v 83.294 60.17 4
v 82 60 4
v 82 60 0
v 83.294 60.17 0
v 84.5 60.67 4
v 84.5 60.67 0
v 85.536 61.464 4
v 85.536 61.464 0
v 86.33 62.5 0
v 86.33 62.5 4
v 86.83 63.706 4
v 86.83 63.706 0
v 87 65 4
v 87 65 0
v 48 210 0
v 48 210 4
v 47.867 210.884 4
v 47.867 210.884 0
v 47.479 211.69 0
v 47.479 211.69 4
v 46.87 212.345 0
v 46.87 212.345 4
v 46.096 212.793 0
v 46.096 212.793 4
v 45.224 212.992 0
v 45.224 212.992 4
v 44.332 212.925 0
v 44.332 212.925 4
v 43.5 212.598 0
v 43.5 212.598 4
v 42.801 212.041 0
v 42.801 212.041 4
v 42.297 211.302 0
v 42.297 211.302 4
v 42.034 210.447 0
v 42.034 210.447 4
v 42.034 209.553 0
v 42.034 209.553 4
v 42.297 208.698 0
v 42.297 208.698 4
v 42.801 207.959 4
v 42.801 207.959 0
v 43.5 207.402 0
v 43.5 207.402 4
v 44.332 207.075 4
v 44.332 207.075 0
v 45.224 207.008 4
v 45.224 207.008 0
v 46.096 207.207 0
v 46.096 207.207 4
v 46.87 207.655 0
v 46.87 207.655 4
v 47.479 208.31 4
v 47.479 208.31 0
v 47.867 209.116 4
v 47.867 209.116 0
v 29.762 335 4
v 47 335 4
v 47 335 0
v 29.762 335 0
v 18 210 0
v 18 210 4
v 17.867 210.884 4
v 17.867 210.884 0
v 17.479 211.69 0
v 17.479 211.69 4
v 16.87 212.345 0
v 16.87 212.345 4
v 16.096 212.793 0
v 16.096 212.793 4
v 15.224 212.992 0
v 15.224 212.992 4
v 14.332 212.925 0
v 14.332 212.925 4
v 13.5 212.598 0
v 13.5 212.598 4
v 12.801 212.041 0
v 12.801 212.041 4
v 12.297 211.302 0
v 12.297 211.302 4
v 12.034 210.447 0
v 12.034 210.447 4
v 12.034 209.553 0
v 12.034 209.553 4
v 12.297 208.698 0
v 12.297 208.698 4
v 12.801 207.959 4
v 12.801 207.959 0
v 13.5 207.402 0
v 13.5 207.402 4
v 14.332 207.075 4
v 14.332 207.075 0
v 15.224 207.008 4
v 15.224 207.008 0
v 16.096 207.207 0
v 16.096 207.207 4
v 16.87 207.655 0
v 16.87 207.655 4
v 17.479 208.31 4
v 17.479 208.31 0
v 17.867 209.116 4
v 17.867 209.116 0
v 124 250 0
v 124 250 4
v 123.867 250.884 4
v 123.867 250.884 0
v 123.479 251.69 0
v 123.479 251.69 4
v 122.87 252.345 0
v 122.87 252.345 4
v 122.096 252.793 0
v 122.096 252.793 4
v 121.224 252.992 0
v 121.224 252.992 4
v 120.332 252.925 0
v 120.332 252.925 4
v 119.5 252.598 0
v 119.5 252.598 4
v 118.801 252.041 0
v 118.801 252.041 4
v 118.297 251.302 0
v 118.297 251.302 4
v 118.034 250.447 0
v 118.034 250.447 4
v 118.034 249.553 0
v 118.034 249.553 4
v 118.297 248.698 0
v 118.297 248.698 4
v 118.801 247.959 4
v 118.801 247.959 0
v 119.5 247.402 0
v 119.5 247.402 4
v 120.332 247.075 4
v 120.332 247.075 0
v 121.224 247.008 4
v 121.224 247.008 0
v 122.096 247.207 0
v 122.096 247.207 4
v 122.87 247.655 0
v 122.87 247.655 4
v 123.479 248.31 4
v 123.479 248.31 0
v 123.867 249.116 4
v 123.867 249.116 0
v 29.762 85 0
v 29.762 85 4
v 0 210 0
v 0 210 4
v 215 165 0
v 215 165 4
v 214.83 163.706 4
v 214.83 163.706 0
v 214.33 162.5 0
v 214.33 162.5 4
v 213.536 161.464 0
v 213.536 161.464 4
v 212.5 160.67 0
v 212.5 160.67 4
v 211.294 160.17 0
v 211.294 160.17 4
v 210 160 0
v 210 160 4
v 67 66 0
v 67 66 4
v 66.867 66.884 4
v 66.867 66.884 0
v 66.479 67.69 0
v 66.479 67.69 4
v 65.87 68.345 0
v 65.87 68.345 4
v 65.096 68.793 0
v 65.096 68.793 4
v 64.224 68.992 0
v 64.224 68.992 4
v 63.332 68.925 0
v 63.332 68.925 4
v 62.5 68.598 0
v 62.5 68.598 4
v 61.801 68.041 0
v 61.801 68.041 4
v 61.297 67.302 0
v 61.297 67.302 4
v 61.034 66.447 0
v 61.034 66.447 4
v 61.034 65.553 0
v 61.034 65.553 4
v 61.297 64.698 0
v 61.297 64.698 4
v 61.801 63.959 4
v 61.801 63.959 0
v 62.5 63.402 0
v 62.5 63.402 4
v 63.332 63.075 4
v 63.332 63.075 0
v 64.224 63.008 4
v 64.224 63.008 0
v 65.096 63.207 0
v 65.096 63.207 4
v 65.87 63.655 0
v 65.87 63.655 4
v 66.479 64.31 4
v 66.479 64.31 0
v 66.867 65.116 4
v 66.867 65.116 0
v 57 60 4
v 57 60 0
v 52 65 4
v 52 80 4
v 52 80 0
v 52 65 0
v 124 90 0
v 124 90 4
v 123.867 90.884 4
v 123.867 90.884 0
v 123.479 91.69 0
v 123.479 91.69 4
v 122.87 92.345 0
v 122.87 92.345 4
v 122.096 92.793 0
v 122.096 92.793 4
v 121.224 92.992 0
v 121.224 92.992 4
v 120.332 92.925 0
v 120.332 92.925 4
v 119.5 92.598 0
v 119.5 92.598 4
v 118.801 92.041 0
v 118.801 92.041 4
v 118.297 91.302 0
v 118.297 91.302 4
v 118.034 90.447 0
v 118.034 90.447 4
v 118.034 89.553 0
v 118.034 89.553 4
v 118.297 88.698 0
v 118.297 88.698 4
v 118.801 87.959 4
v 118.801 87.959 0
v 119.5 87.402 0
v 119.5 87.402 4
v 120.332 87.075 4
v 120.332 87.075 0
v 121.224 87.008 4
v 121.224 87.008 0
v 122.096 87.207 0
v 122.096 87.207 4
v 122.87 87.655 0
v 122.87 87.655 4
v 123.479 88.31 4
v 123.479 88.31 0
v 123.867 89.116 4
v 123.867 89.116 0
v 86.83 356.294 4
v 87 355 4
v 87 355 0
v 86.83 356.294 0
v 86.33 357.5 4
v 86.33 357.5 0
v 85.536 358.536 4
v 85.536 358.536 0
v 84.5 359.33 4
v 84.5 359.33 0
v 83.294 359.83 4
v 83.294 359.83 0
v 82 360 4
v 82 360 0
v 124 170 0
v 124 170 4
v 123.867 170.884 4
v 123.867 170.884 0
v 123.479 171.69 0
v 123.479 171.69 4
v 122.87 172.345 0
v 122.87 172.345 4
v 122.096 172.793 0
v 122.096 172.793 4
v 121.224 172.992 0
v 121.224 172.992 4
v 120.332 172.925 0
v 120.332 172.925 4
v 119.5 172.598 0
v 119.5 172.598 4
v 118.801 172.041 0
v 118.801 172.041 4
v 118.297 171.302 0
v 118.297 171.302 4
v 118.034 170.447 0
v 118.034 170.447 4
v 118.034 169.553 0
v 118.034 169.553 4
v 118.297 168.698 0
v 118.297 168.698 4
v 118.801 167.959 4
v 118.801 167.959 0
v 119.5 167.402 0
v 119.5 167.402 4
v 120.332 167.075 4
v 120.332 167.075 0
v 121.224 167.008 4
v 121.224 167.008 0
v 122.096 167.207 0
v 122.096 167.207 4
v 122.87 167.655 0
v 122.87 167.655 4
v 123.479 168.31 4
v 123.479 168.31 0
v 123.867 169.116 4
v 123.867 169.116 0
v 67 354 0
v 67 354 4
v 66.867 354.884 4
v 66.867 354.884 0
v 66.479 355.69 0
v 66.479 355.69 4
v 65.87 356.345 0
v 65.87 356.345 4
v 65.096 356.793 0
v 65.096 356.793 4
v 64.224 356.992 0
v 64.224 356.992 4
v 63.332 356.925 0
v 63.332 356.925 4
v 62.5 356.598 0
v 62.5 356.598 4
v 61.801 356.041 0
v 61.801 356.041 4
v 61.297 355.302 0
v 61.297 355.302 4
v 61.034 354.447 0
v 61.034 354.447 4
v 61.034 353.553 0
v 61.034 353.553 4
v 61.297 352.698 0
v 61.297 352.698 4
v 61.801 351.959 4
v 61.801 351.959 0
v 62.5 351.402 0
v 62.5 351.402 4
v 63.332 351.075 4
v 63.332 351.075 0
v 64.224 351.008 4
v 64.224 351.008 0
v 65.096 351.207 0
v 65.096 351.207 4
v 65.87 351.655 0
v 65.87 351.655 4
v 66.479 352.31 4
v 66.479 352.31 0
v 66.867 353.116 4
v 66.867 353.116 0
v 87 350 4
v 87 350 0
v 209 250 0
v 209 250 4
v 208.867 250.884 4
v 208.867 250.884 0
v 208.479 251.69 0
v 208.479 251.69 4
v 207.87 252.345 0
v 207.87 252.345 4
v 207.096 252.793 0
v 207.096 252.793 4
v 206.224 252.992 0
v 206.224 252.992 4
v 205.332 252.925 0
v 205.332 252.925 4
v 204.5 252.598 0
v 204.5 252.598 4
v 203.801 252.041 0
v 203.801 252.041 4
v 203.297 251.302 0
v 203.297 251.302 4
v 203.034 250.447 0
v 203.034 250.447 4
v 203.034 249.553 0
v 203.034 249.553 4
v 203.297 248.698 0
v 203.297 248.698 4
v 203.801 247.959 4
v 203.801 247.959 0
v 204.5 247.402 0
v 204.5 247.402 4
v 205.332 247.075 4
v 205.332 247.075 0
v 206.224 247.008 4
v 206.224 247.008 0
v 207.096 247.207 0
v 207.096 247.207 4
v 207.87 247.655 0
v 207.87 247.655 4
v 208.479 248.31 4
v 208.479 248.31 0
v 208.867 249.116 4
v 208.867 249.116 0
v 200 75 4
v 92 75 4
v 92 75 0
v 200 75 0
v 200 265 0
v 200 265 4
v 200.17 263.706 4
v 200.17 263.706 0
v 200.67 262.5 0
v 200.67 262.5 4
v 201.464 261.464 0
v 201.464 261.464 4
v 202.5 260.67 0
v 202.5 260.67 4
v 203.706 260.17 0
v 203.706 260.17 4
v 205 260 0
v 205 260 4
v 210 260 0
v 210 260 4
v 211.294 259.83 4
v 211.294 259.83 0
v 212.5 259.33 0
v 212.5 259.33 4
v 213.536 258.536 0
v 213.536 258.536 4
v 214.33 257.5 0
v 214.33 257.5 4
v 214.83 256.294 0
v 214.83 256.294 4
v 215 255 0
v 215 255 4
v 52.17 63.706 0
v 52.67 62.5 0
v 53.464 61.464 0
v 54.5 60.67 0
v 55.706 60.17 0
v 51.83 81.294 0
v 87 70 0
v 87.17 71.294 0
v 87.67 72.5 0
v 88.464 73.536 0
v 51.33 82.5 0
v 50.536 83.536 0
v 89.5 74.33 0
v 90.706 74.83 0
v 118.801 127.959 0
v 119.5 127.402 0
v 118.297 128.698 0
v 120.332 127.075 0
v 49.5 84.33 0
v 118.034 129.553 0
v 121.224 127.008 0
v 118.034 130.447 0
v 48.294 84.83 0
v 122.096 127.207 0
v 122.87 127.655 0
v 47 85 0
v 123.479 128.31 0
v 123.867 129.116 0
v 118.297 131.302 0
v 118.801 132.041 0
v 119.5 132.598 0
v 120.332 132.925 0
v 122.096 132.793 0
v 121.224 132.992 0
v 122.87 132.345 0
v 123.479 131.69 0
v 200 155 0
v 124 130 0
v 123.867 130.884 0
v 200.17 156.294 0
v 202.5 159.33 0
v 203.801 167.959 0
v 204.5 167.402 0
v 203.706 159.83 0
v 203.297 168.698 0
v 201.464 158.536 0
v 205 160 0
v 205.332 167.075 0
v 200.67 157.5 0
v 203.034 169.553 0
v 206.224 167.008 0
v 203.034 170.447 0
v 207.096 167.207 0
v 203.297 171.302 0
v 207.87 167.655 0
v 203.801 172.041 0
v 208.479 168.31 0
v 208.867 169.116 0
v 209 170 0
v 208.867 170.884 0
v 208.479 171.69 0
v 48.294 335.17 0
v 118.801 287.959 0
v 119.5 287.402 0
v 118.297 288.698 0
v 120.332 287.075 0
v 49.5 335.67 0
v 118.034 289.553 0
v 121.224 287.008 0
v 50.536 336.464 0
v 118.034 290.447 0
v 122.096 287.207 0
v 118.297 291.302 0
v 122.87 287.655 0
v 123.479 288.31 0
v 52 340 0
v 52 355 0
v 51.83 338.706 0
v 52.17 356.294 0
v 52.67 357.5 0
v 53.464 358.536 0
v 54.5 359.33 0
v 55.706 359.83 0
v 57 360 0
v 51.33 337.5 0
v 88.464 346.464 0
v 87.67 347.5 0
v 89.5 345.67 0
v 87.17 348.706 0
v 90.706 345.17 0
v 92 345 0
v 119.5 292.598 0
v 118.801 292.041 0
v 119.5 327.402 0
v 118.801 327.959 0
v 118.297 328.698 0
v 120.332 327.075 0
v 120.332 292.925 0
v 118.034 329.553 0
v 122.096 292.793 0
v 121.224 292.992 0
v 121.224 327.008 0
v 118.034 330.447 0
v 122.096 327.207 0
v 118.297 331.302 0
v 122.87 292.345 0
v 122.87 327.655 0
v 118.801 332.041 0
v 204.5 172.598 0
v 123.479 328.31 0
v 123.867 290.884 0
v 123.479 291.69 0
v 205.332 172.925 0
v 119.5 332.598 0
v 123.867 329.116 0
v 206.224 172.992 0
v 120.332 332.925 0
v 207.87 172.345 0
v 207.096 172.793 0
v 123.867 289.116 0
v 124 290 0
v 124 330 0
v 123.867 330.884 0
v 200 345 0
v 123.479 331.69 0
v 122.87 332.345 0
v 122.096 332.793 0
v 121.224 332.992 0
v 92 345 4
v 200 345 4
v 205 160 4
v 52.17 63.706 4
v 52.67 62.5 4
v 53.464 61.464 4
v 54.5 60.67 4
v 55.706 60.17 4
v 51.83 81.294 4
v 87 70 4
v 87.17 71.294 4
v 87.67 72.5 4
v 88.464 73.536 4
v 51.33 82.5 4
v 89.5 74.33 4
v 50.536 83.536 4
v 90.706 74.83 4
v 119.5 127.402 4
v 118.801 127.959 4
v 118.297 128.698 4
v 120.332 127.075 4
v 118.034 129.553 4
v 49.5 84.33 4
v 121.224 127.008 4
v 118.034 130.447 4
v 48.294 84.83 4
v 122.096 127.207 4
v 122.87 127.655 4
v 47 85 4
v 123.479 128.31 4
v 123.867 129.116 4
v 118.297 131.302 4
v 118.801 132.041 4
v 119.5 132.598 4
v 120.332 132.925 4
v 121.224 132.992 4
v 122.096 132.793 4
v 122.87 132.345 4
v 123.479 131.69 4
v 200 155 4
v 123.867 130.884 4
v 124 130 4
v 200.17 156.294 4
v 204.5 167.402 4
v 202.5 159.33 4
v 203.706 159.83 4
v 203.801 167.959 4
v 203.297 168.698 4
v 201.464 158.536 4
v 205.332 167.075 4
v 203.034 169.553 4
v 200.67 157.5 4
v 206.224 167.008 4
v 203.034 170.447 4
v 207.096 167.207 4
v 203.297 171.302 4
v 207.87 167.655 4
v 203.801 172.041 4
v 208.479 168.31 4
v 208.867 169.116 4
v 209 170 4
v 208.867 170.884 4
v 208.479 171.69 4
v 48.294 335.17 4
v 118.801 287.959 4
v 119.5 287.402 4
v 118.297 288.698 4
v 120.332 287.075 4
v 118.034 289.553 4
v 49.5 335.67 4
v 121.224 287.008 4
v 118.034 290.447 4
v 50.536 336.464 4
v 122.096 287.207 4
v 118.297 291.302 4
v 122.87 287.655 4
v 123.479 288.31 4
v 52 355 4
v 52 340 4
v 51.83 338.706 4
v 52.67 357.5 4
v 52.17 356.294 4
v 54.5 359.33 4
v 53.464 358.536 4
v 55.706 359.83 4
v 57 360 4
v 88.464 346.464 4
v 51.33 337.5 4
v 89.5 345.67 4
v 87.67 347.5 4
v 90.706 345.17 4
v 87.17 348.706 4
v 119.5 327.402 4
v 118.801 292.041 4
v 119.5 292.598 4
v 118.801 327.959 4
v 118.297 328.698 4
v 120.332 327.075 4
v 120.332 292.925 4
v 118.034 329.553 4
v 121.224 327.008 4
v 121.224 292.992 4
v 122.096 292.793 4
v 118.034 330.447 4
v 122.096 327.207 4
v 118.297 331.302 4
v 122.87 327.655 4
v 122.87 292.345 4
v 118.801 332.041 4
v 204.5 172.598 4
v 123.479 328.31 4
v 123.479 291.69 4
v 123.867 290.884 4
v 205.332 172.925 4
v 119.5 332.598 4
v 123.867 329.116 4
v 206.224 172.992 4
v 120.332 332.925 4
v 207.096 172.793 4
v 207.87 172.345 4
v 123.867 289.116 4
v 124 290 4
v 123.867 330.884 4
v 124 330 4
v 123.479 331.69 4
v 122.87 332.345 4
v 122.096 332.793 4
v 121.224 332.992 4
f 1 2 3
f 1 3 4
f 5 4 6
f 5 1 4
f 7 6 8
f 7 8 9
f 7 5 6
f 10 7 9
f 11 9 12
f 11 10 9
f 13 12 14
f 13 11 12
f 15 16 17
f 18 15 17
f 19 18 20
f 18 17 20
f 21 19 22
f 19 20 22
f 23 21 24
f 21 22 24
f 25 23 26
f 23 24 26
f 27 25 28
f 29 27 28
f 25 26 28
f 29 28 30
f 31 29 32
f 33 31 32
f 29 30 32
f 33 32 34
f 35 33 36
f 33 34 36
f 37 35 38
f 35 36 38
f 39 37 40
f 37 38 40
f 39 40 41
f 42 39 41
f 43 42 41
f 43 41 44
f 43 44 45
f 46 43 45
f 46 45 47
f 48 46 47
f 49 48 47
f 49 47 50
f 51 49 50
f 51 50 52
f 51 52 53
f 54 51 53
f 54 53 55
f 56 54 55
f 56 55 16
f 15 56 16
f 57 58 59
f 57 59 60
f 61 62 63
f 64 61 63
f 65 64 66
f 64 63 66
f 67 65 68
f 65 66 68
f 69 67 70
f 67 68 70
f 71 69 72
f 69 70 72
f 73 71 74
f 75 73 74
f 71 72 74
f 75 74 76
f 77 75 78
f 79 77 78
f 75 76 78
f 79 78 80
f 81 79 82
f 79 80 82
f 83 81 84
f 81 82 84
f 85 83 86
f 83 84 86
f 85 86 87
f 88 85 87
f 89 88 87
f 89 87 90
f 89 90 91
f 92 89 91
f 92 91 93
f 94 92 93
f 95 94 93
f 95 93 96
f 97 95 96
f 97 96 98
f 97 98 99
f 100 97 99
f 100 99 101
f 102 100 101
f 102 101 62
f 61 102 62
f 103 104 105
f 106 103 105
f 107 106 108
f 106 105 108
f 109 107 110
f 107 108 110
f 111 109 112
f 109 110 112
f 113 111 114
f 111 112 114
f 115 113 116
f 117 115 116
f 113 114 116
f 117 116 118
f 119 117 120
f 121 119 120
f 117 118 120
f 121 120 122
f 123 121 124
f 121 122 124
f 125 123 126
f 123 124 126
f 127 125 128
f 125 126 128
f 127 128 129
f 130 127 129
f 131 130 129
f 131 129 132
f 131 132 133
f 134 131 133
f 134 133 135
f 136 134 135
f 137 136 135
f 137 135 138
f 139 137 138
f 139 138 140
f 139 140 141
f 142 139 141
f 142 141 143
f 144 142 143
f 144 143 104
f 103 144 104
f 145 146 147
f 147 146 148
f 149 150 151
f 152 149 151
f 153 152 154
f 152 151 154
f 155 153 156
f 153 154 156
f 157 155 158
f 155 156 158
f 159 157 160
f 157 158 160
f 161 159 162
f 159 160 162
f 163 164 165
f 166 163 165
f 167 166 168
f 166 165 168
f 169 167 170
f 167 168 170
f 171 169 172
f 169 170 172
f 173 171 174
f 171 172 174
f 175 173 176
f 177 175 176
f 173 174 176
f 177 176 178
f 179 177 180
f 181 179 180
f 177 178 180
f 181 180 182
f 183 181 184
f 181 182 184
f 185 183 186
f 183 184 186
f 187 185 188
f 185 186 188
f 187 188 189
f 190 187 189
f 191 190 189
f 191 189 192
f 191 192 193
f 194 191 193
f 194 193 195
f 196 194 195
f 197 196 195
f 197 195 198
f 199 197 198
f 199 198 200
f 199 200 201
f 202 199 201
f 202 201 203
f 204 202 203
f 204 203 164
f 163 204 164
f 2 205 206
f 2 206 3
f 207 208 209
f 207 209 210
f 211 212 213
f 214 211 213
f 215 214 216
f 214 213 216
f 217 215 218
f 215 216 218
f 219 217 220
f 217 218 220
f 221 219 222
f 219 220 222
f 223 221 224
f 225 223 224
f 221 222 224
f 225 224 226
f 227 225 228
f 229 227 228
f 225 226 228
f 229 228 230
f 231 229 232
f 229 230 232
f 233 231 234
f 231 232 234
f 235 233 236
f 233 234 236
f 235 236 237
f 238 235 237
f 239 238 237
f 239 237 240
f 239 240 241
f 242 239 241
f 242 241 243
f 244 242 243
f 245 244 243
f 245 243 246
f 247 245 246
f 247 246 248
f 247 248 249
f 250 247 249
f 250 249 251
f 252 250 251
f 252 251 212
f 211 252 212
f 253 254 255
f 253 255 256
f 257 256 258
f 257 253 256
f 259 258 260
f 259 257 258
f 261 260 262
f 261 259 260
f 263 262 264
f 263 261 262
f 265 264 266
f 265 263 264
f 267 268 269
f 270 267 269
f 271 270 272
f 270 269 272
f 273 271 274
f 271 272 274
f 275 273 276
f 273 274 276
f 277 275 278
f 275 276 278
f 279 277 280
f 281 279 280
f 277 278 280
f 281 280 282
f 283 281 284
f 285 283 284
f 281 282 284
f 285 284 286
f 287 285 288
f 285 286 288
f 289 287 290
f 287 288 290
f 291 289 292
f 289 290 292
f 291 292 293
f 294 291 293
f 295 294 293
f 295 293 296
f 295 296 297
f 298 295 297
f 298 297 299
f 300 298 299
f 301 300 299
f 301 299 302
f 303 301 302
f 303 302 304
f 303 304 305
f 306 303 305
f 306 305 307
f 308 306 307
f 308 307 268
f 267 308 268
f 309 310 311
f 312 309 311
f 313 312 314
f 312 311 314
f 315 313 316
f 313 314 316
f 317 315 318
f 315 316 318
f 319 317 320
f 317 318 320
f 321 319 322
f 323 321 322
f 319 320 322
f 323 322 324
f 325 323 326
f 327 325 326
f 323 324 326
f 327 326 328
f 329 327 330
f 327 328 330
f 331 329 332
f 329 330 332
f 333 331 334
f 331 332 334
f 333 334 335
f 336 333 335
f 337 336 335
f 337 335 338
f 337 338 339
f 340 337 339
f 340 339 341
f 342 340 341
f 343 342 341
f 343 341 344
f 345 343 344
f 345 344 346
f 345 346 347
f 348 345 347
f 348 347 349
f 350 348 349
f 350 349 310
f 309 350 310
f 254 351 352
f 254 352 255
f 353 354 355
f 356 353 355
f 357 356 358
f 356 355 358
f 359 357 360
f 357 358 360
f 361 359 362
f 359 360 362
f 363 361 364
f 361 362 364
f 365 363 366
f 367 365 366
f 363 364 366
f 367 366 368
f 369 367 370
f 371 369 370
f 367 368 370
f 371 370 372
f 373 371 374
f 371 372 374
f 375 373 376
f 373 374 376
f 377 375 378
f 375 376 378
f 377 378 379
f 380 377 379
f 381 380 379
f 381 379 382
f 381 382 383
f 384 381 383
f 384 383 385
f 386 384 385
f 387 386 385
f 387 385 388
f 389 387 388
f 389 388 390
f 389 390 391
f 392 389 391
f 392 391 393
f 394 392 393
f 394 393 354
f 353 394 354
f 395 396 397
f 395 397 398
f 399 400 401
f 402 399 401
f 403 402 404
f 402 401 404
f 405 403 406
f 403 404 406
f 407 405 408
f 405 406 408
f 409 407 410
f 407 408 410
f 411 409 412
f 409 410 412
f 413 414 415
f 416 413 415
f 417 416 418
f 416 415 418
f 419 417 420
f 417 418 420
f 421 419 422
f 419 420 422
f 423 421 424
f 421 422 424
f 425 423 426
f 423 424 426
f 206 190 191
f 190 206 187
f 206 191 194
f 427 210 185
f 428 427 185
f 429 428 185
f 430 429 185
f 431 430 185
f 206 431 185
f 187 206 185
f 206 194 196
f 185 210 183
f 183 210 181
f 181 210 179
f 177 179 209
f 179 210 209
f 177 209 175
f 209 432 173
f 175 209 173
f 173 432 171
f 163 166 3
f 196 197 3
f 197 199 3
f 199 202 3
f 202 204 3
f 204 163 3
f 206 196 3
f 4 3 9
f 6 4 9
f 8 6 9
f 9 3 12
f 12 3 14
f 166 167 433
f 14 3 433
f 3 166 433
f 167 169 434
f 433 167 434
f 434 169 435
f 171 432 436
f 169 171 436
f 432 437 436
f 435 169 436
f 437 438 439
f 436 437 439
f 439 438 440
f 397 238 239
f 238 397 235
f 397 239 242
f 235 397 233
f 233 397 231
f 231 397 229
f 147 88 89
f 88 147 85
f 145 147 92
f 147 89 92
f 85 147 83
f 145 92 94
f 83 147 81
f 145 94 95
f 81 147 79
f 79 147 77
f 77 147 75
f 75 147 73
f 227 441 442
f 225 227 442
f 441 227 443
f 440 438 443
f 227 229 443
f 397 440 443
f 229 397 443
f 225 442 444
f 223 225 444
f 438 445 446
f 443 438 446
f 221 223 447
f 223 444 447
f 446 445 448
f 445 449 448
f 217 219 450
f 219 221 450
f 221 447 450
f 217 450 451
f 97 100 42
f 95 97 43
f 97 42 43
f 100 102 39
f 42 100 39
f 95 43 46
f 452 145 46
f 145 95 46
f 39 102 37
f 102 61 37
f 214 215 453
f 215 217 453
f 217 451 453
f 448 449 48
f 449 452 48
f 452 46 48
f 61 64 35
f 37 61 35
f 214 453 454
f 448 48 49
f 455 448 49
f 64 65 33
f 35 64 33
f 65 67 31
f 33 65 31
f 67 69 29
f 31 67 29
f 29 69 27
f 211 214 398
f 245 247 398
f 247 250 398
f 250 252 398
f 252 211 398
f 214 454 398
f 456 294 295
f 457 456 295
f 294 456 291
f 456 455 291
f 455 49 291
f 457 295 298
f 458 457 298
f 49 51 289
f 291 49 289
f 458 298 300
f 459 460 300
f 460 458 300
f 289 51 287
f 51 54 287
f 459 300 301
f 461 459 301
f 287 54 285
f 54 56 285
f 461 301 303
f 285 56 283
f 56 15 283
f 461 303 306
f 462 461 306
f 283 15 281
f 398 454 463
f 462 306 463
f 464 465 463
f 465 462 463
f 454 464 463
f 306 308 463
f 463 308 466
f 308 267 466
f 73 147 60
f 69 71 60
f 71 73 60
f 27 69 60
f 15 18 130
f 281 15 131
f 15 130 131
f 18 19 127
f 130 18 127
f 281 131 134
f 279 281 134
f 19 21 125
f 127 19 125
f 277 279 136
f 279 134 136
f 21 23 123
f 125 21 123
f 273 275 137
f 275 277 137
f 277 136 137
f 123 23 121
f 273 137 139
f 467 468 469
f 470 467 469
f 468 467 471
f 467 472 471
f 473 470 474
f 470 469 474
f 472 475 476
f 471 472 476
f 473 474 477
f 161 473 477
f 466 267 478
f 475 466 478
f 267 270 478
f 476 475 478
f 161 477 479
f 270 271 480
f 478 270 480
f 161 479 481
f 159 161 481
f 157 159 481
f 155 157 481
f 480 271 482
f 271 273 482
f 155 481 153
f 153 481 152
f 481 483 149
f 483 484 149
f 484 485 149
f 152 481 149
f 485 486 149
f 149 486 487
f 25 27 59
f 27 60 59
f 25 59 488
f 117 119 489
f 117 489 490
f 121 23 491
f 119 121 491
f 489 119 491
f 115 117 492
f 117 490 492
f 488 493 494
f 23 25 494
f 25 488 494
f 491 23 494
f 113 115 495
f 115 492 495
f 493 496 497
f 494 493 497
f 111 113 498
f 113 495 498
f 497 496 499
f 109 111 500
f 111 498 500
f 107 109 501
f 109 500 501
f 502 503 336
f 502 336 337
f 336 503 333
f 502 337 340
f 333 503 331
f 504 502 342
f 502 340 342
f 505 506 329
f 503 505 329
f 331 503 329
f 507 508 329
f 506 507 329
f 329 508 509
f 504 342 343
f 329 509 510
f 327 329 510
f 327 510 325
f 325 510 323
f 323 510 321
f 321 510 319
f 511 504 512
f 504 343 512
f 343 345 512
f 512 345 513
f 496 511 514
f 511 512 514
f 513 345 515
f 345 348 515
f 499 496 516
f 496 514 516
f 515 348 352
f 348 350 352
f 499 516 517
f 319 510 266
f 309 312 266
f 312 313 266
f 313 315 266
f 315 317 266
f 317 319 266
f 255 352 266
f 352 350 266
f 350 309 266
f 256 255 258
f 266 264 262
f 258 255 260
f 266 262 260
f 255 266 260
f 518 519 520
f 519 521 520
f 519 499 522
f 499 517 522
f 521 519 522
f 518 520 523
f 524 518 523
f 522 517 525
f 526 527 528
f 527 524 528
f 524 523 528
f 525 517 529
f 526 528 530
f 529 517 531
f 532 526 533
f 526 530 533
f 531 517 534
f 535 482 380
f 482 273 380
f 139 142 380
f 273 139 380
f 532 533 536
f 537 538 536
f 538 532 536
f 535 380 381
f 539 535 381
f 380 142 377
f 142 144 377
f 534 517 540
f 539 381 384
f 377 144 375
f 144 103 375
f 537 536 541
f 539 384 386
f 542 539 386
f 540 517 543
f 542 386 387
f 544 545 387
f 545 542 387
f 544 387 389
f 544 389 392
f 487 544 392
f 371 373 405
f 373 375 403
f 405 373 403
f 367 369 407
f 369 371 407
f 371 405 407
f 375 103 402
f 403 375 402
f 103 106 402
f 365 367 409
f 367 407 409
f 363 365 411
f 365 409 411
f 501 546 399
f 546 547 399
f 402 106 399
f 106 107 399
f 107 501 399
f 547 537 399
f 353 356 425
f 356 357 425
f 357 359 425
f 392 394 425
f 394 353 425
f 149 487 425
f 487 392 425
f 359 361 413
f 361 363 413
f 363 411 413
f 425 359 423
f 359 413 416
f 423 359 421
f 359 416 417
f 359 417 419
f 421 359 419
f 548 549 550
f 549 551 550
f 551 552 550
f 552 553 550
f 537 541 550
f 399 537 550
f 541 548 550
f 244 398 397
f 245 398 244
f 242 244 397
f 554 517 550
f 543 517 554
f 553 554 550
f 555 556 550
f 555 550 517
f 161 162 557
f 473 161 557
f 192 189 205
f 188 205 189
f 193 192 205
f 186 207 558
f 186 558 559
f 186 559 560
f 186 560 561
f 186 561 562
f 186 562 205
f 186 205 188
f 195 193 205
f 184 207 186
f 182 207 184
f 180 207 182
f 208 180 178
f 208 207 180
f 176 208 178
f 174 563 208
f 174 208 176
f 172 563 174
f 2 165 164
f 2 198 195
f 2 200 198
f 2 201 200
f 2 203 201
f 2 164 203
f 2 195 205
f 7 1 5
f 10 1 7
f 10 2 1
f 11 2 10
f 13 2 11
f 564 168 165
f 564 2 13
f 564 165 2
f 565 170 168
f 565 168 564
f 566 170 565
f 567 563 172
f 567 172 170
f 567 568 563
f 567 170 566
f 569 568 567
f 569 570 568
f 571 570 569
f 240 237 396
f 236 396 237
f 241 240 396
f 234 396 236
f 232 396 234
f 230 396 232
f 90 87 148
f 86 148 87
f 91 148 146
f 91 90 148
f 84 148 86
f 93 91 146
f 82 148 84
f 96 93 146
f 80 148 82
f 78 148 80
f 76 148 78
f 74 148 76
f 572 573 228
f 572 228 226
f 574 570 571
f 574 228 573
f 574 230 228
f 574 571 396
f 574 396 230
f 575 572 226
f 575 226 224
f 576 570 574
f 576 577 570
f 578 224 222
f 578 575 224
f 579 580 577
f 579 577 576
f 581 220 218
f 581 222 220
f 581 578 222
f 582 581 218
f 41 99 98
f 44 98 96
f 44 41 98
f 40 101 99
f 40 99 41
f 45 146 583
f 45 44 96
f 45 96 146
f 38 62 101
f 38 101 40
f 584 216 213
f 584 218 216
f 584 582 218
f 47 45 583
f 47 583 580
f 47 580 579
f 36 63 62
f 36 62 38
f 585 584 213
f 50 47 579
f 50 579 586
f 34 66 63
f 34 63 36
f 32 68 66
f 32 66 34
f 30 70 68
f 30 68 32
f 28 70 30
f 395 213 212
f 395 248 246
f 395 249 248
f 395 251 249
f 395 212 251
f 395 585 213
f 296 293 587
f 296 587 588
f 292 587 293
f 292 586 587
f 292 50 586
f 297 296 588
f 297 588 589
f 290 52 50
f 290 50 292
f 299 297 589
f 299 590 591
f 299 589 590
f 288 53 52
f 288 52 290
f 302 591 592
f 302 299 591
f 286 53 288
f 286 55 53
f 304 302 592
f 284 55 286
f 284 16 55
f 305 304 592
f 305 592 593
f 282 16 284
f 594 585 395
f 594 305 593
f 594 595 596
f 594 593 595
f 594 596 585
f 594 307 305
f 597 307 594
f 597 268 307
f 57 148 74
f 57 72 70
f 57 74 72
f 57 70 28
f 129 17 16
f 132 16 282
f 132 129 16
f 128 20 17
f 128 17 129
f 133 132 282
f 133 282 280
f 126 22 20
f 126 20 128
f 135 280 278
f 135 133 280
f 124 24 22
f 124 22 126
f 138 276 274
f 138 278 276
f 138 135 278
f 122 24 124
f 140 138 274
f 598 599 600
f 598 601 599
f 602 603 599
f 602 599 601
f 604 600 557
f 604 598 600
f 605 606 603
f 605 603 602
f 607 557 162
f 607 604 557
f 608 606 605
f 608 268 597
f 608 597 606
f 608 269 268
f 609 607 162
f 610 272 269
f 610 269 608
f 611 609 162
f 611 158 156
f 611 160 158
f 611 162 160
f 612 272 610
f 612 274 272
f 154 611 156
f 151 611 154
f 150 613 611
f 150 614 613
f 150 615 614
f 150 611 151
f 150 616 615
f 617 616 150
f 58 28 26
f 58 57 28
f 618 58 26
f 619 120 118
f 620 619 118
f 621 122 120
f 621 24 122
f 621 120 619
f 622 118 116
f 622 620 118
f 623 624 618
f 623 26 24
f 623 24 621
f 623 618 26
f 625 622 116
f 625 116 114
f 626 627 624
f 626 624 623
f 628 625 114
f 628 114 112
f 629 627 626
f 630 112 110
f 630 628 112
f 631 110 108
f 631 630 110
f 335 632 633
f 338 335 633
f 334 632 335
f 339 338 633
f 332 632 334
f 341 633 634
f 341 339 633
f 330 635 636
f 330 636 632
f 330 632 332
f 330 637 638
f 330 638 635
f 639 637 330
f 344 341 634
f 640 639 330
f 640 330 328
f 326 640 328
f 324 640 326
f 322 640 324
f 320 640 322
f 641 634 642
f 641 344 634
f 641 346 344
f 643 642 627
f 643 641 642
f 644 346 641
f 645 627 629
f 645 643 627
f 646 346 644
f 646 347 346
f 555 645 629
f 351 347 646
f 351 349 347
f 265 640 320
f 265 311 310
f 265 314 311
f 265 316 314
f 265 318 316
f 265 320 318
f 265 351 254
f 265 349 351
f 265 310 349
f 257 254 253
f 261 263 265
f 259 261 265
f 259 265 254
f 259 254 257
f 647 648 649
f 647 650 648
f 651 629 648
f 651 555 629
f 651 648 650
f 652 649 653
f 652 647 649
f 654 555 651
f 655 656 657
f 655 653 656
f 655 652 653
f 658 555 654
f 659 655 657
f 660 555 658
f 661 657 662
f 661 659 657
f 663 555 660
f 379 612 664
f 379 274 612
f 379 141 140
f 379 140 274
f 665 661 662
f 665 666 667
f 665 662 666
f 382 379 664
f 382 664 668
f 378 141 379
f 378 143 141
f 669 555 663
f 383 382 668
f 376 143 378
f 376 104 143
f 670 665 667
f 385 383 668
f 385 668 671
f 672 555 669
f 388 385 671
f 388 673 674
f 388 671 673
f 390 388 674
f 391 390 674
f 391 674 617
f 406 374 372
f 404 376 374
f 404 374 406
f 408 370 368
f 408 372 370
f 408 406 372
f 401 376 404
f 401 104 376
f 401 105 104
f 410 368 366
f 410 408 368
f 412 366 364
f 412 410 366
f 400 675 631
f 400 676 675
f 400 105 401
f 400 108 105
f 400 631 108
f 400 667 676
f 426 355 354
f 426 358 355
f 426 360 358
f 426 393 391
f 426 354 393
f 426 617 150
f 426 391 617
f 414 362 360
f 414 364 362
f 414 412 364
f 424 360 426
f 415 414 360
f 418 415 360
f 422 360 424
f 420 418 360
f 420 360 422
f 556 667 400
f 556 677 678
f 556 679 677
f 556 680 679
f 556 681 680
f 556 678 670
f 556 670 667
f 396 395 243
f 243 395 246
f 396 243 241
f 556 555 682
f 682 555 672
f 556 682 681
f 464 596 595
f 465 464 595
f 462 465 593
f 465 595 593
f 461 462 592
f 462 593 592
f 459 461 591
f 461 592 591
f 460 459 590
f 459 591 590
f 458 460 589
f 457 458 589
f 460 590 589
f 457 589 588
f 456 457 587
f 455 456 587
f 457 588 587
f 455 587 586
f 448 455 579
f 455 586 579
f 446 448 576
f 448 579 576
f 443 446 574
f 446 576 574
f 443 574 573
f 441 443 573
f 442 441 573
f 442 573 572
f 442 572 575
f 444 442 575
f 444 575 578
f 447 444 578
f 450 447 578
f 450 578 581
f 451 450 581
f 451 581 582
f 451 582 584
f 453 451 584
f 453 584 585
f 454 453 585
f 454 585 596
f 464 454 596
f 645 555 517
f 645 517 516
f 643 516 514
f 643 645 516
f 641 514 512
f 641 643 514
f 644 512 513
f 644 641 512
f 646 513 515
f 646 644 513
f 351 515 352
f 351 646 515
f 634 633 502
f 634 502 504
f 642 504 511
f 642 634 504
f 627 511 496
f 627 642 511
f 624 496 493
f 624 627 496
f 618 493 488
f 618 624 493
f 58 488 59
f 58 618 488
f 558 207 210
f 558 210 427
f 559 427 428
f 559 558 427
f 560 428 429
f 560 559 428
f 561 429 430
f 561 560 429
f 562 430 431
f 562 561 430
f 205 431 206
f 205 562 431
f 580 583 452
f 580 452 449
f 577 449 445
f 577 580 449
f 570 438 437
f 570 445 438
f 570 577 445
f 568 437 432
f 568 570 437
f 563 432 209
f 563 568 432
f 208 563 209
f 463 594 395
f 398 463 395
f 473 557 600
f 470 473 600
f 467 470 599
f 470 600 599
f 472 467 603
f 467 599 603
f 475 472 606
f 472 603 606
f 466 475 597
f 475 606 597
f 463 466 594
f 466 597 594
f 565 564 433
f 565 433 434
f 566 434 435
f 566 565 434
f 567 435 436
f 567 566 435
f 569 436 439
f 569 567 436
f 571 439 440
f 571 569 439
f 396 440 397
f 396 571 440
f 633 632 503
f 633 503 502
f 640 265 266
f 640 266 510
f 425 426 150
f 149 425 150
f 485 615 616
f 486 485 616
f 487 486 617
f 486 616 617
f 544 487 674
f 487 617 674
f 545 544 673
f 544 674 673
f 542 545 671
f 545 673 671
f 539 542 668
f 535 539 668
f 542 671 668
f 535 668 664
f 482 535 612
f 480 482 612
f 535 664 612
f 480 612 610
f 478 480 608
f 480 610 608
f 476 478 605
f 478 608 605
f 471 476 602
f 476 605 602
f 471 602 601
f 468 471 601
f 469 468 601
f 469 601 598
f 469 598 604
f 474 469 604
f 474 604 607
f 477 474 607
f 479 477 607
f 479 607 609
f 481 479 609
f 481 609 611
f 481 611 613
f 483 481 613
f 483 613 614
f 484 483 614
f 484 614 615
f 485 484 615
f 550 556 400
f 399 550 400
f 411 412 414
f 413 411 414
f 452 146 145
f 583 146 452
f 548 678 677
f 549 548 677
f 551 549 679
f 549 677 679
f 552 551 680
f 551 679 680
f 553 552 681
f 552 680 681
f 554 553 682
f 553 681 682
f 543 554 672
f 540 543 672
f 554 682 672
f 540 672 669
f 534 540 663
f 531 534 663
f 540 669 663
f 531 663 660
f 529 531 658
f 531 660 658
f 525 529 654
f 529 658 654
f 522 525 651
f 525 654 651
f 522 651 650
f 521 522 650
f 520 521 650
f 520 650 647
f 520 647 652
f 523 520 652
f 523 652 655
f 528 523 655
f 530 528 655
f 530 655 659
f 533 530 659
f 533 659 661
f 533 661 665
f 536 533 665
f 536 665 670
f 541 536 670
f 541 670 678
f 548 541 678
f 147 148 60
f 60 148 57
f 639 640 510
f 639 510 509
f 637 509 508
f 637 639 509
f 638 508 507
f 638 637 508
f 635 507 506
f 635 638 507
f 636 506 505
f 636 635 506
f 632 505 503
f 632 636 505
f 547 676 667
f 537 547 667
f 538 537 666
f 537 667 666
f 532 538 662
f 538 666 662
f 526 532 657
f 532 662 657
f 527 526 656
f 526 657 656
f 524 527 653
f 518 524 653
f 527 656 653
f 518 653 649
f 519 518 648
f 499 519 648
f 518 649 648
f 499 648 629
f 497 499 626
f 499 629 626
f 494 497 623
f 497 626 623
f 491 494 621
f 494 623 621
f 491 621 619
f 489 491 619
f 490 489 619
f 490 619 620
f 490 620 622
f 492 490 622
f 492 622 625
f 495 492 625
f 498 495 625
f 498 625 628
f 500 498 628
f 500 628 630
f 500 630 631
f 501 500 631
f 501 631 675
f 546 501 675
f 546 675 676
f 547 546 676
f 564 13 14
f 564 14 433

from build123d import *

# Parameters (mm, degrees)
F0_W      = 320
F0_H      = 420
F1_DEPTH  = 4
F3_DEPTH  = 4
F4_R      = 3
F5_DEPTH  = 25
F6_R      = 3
F7_DEPTH  = 25
F8_R      = 3
F9_DEPTH  = 25
F11_DEPTH = 25
F13_DEPTH = 25


with BuildPart() as f1:
    # F0 (on Top) → F1 (new body)
    with BuildSketch(Plane.XY):
        with Locations((160, 210)):
            Rectangle(F0_W, F0_H)
    extrude(amount=F1_DEPTH)

    # F2 (on face) → F3 (cut, through all)
    with BuildSketch(Plane.XY.offset(4)):
        Polygon((320, 420), (290, 420), (320, 360), align=None)
        Polygon((320, 60), (290, 0), (320, 0), align=None)
        with BuildLine():
            Line((113, 360), (213, 360))
            ThreePointArc((213, 360), (216.535534, 361.464466), (218, 365))
            Line((218, 365), (218, 403))
            ThreePointArc((218, 403), (216.535534, 406.535534), (213, 408))
            Line((213, 408), (113, 408))
            ThreePointArc((113, 408), (109.464466, 406.535534), (108, 403))
            Line((108, 403), (108, 365))
            ThreePointArc((108, 365), (109.464466, 361.464466), (113, 360))
        make_face()
        with BuildLine():
            Line((113, 12), (213, 12))
            ThreePointArc((213, 12), (216.535534, 13.464466), (218, 17))
            Line((218, 17), (218, 55))
            ThreePointArc((218, 55), (216.535534, 58.535534), (213, 60))
            Line((213, 60), (113, 60))
            ThreePointArc((113, 60), (109.464466, 58.535534), (108, 55))
            Line((108, 55), (108, 17))
            ThreePointArc((108, 17), (109.464466, 13.464466), (113, 12))
        make_face()
        Polygon((0, 420), (0, 210), (50, 420), align=None)
        Polygon((50, 0), (0, 210), (0, 0), align=None)
    extrude(amount=-F3_DEPTH, mode=Mode.SUBTRACT)

    # F4 (on face) → F5 (cut)
    with BuildSketch(Plane.XY.offset(4)):
        with Locations((67, 6)):
            Circle(F4_R)
        with Locations((97, 6)):
            Circle(F4_R)
        with Locations((127, 6)):
            Circle(F4_R)
        with Locations((157, 6)):
            Circle(F4_R)
        with Locations((187, 6)):
            Circle(F4_R)
        with Locations((217, 6)):
            Circle(F4_R)
        with Locations((247, 6)):
            Circle(F4_R)
        with Locations((277, 6)):
            Circle(F4_R)
        with Locations((64, 66)):
            Circle(F4_R)
        with Locations((94, 66)):
            Circle(F4_R)
        with Locations((124, 66)):
            Circle(F4_R)
        with Locations((220, 66)):
            Circle(F4_R)
        with Locations((250, 66)):
            Circle(F4_R)
        with Locations((280, 66)):
            Circle(F4_R)
        with Locations((310, 66)):
            Circle(F4_R)
        with Locations((67, 414)):
            Circle(F4_R)
        with Locations((64, 354)):
            Circle(F4_R)
        with Locations((97, 414)):
            Circle(F4_R)
        with Locations((310, 354)):
            Circle(F4_R)
        with Locations((277, 414)):
            Circle(F4_R)
        with Locations((94, 354)):
            Circle(F4_R)
        with Locations((220, 354)):
            Circle(F4_R)
        with Locations((280, 354)):
            Circle(F4_R)
        with Locations((124, 354)):
            Circle(F4_R)
        with Locations((127, 414)):
            Circle(F4_R)
        with Locations((250, 354)):
            Circle(F4_R)
        with Locations((157, 414)):
            Circle(F4_R)
        with Locations((187, 414)):
            Circle(F4_R)
        with Locations((217, 414)):
            Circle(F4_R)
        with Locations((247, 414)):
            Circle(F4_R)
    extrude(amount=-F5_DEPTH, mode=Mode.SUBTRACT)

    # F6 (on face) → F7 (cut)
    with BuildSketch(Plane.XY.offset(4)):
        with Locations((121, 90)):
            Circle(F6_R)
        with Locations((121, 130)):
            Circle(F6_R)
        with Locations((121, 170)):
            Circle(F6_R)
        with Locations((206, 90)):
            Circle(F6_R)
        with Locations((206, 130)):
            Circle(F6_R)
        with Locations((206, 170)):
            Circle(F6_R)
        with Locations((291, 80)):
            Circle(F6_R)
        with Locations((291, 120)):
            Circle(F6_R)
        with Locations((291, 160)):
            Circle(F6_R)
        with Locations((121, 330)):
            Circle(F6_R)
        with Locations((121, 290)):
            Circle(F6_R)
        with Locations((206, 330)):
            Circle(F6_R)
        with Locations((206, 250)):
            Circle(F6_R)
        with Locations((291, 340)):
            Circle(F6_R)
        with Locations((121, 250)):
            Circle(F6_R)
        with Locations((206, 290)):
            Circle(F6_R)
        with Locations((291, 300)):
            Circle(F6_R)
        with Locations((291, 260)):
            Circle(F6_R)
    extrude(amount=-F7_DEPTH, mode=Mode.SUBTRACT)

    # F8 (on face) → F9 (cut)
    with BuildSketch(Plane.XY.offset(4)):
        with Locations((15, 210)):
            Circle(F8_R)
        with Locations((45, 210)):
            Circle(F8_R)
    extrude(amount=-F9_DEPTH, mode=Mode.SUBTRACT)

    # F10 (on face) → F11 (intersect)
    with BuildSketch(Plane.XY.offset(4)):
        with BuildLine():
            Line((87, 350), (87, 355))
            ThreePointArc((87, 355), (85.535534, 358.535534), (82, 360))
            Line((82, 360), (57, 360))
            ThreePointArc((57, 360), (53.464466, 358.535534), (52, 355))
            Line((52, 355), (52, 340))
            ThreePointArc((52, 340), (50.535534, 336.464466), (47, 335))
            Line((47, 335), (0, 335))
            Line((0, 335), (0, 210))
            Line((0, 210), (0, 85))
            Line((0, 85), (47, 85))
            ThreePointArc((47, 85), (50.535534, 83.535534), (52, 80))
            Line((52, 80), (52, 65))
            ThreePointArc((52, 65), (53.464466, 61.464466), (57, 60))
            Line((57, 60), (82, 60))
            ThreePointArc((82, 60), (85.535534, 61.464466), (87, 65))
            Line((87, 65), (87, 70))
            ThreePointArc((87, 70), (88.464466, 73.535534), (92, 75))
            Line((92, 75), (275, 75))
            ThreePointArc((275, 75), (278.535534, 76.464466), (280, 80))
            Line((280, 80), (280, 82))
            ThreePointArc((280, 82), (281.464466, 85.535534), (285, 87))
            Line((285, 87), (320, 87))
            Line((320, 87), (320, 210))
            Line((320, 210), (320, 333))
            Line((320, 333), (285, 333))
            ThreePointArc((285, 333), (281.464466, 334.464466), (280, 338))
            Line((280, 338), (280, 340))
            ThreePointArc((280, 340), (278.535534, 343.535534), (275, 345))
            Line((275, 345), (92, 345))
            ThreePointArc((92, 345), (88.464466, 346.464466), (87, 350))
        make_face()
    extrude(amount=-F11_DEPTH, mode=Mode.INTERSECT)

    # F12 (on face) → F13 (cut)
    with BuildSketch(Plane.XY.offset(4)):
        with BuildLine():
            Line((320, 75), (320, 345))
            Line((320, 345), (200, 345))
            Line((200, 345), (200, 265))
            ThreePointArc((200, 265), (201.464466, 261.464466), (205, 260))
            Line((205, 260), (210, 260))
            ThreePointArc((210, 260), (213.535534, 258.535534), (215, 255))
            Line((215, 255), (215, 165))
            ThreePointArc((215, 165), (213.535534, 161.464466), (210, 160))
            Line((210, 160), (205, 160))
            ThreePointArc((205, 160), (201.464466, 158.535534), (200, 155))
            Line((200, 155), (200, 75))
            Line((200, 75), (320, 75))
        make_face()
    extrude(amount=-F13_DEPTH, mode=Mode.SUBTRACT)


solid = f1.part
